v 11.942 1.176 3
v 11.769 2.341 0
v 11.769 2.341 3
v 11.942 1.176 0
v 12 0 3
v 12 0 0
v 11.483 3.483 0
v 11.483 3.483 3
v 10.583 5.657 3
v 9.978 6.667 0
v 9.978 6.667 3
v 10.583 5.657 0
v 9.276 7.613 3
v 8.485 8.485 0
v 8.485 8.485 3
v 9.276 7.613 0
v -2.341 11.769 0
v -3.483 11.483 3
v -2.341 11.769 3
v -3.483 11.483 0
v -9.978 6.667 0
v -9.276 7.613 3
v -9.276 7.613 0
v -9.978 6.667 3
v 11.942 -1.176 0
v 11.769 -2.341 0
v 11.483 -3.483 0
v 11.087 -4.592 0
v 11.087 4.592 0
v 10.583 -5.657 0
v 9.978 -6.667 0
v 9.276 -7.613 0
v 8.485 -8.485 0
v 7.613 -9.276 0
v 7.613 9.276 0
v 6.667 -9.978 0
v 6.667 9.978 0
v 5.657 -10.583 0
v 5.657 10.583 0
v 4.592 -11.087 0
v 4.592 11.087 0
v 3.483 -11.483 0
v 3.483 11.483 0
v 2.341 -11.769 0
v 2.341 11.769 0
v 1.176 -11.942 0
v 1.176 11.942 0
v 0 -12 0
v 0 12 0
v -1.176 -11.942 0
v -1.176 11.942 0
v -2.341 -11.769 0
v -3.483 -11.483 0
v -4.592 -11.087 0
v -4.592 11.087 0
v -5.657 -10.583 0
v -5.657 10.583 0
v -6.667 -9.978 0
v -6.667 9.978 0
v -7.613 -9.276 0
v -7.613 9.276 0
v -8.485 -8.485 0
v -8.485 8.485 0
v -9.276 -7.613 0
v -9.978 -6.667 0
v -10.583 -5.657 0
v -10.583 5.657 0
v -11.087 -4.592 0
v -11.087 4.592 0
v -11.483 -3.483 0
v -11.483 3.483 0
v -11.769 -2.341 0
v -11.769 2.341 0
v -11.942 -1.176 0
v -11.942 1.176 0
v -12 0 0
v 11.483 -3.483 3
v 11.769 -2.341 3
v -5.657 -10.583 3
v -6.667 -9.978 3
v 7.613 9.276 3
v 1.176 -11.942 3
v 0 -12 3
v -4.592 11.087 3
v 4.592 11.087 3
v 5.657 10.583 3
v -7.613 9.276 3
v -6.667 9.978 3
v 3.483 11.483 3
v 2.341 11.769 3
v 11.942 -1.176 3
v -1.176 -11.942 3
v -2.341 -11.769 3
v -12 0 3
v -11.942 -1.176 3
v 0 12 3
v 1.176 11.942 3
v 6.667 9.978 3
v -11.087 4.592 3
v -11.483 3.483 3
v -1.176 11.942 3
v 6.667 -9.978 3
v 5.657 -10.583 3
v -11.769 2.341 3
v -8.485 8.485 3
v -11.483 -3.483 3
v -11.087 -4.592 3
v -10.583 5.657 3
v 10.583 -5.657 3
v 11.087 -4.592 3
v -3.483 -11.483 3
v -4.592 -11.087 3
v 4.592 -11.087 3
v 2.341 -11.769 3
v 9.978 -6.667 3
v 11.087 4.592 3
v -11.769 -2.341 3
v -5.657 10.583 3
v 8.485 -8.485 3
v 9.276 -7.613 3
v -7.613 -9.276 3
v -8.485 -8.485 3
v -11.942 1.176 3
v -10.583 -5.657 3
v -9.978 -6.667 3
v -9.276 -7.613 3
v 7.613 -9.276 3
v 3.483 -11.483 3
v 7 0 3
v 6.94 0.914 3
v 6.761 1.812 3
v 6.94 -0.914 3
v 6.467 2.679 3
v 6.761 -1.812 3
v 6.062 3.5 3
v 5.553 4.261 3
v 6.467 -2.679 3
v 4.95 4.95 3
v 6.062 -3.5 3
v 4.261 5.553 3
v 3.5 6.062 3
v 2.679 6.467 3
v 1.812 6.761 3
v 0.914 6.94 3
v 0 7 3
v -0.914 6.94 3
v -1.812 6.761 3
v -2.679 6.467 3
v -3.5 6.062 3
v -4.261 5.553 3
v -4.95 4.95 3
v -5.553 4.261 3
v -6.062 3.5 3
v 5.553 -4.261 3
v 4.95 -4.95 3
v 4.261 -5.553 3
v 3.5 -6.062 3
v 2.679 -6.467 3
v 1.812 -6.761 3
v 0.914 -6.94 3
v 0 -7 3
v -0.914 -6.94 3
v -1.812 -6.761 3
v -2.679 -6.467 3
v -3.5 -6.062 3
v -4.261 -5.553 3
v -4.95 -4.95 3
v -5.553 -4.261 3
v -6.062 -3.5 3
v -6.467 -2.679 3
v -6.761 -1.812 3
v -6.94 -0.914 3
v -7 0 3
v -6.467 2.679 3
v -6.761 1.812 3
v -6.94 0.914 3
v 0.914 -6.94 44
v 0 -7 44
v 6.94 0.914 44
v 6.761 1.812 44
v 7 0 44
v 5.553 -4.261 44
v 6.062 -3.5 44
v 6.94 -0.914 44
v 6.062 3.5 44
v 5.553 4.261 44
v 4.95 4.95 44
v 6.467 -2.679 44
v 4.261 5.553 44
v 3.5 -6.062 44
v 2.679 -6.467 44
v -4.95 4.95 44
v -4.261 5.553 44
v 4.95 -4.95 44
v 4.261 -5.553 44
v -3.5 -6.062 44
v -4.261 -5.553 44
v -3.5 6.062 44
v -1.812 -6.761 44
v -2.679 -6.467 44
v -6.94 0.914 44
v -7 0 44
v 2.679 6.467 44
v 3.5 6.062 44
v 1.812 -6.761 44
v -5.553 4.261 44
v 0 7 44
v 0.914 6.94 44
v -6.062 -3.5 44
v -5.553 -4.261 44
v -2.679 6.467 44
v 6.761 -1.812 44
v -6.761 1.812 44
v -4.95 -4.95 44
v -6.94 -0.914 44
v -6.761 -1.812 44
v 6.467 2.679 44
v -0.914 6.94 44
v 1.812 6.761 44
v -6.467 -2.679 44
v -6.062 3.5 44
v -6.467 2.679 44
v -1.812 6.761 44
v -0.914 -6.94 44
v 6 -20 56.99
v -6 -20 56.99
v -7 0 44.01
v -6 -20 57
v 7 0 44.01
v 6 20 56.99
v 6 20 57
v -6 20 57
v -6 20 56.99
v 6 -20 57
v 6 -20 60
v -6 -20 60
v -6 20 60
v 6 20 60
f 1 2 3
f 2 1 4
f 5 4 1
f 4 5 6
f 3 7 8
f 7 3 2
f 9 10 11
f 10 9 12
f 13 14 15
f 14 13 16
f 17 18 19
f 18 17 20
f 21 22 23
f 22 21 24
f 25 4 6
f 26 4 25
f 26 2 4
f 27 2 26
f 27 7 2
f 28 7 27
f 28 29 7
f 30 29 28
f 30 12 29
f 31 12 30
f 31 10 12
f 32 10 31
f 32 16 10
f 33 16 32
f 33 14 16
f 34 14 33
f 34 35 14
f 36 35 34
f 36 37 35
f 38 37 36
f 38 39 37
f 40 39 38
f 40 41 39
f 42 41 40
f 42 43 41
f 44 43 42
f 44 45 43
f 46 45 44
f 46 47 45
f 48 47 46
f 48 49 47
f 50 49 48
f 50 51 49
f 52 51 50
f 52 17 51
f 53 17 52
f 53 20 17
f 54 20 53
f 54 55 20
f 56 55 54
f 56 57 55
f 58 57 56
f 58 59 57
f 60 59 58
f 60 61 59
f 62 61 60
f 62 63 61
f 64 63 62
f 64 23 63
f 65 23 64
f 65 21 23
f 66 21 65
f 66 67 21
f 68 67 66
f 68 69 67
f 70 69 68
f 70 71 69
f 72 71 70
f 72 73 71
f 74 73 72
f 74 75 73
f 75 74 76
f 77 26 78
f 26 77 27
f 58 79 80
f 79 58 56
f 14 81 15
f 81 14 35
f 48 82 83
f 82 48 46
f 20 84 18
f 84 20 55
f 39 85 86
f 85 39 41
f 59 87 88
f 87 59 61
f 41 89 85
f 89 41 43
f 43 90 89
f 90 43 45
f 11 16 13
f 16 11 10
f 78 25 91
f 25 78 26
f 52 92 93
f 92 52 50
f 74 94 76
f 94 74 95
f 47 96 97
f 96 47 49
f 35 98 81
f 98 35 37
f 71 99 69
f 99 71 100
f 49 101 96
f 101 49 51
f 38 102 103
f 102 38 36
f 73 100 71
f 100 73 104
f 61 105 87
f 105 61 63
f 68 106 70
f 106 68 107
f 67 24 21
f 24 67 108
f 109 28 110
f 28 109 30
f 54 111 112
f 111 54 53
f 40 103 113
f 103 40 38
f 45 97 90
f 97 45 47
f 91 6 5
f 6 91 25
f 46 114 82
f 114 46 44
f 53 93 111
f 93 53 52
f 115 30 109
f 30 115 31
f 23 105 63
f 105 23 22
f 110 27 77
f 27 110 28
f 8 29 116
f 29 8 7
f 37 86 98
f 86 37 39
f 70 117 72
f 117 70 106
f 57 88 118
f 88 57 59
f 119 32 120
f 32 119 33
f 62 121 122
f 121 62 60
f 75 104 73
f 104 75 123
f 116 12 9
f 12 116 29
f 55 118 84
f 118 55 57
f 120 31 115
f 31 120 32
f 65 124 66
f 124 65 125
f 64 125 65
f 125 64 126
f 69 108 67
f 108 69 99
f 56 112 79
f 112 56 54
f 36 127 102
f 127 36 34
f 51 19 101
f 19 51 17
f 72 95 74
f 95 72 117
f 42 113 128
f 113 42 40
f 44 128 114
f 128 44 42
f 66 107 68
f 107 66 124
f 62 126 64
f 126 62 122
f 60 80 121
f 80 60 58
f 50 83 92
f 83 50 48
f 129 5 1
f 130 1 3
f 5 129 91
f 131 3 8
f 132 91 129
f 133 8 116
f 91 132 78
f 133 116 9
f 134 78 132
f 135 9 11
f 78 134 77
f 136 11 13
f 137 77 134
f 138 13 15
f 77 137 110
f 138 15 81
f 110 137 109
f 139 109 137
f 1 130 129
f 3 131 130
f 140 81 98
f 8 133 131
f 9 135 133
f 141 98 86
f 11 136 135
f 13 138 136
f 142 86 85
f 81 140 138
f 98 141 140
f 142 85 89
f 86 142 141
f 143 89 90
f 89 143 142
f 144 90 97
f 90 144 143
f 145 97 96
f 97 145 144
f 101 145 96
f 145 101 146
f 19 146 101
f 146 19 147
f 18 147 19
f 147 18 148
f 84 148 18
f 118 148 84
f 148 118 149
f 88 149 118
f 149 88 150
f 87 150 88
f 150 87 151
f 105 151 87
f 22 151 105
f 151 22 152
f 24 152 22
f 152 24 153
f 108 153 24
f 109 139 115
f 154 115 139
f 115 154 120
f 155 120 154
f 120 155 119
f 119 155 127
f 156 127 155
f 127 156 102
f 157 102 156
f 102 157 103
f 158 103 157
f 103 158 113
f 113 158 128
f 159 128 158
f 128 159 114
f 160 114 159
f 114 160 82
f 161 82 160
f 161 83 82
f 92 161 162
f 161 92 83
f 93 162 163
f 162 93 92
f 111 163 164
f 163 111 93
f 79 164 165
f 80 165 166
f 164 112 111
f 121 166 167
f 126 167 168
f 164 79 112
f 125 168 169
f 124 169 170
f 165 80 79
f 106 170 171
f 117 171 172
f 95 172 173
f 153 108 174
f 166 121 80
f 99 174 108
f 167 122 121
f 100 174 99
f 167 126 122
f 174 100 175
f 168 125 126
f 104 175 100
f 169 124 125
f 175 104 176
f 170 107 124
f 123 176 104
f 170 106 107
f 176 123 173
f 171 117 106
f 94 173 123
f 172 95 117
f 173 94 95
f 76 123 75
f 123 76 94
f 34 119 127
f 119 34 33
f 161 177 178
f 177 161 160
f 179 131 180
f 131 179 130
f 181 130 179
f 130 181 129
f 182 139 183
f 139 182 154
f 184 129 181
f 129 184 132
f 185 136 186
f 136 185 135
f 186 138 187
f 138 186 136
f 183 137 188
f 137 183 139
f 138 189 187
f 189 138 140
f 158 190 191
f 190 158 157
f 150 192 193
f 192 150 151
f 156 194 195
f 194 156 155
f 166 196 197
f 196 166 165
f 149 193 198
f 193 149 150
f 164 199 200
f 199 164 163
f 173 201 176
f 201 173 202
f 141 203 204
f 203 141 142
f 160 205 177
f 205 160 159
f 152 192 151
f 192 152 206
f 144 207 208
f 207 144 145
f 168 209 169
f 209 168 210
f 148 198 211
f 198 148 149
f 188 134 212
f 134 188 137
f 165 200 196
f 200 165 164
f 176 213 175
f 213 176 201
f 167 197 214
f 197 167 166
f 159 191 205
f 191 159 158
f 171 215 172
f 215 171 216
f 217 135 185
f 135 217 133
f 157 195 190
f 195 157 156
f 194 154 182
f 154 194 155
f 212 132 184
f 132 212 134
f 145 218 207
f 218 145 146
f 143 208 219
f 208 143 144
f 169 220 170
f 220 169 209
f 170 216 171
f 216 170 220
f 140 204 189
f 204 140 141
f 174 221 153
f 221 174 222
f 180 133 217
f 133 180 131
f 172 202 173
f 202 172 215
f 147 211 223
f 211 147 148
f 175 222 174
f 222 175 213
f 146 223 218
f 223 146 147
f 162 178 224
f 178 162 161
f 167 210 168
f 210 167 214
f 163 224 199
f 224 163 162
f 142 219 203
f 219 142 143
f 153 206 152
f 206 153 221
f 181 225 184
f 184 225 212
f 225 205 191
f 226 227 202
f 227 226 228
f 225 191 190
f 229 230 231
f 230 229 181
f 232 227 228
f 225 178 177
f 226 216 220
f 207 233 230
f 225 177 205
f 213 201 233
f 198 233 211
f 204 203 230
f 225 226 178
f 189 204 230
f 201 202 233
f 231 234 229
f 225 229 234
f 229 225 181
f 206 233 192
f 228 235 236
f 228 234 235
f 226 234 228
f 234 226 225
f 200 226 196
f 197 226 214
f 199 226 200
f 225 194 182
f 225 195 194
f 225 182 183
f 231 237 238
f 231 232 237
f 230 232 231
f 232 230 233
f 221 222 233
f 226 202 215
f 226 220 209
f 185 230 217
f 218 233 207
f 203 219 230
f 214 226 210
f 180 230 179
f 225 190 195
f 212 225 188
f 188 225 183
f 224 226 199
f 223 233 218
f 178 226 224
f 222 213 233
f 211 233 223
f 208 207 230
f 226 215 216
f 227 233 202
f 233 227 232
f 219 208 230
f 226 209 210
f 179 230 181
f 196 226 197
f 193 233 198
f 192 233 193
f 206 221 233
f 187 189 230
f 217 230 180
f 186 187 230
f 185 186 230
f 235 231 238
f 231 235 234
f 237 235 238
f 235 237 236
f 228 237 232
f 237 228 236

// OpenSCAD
// Wall standoff for the SKÅDIS board: if the board stands with its back toward a wall, two
// of these at its top corners rest on the wall and the sway is gone, because the board is
// then held at the top as well as at the clamps. A 12 x 40 mm foot glues to the back in one
// of the solid bands (x = 20, 40, 60 ... from a tile's edge, where there are no slots), a
// 14 mm stem reaches `reach` mm, and a 24 mm disc takes a felt pad. Measure the gap from the
// board's back to the wall at the top, subtract 3 for the pad, set `reach` (30 or more).
// Print standing on the disc, as saved, PETG, 100 %, brim if you like. x2
//   openscad -D reach=60 -o skadis-wall-standoff-x2.stl skadis-wall-standoff.scad

reach = 60;
foot = [12, 40, 3]; stem = 14; disc = 24; disc_t = 3; flare = 13;   // the 45° flare under the foot

cylinder(d = disc, h = disc_t, $fn = 64);
cylinder(d = stem, h = reach - foot[2] - flare + 0.01, $fn = 48);
hull() {
    translate([0, 0, reach - foot[2] - flare]) cylinder(d = stem, h = 0.01, $fn = 48);
    translate([-foot[0] / 2, -foot[1] / 2, reach - foot[2] - 0.01]) cube([foot[0], foot[1], 0.01]);
}
translate([-foot[0] / 2, -foot[1] / 2, reach - foot[2]]) cube(foot);
